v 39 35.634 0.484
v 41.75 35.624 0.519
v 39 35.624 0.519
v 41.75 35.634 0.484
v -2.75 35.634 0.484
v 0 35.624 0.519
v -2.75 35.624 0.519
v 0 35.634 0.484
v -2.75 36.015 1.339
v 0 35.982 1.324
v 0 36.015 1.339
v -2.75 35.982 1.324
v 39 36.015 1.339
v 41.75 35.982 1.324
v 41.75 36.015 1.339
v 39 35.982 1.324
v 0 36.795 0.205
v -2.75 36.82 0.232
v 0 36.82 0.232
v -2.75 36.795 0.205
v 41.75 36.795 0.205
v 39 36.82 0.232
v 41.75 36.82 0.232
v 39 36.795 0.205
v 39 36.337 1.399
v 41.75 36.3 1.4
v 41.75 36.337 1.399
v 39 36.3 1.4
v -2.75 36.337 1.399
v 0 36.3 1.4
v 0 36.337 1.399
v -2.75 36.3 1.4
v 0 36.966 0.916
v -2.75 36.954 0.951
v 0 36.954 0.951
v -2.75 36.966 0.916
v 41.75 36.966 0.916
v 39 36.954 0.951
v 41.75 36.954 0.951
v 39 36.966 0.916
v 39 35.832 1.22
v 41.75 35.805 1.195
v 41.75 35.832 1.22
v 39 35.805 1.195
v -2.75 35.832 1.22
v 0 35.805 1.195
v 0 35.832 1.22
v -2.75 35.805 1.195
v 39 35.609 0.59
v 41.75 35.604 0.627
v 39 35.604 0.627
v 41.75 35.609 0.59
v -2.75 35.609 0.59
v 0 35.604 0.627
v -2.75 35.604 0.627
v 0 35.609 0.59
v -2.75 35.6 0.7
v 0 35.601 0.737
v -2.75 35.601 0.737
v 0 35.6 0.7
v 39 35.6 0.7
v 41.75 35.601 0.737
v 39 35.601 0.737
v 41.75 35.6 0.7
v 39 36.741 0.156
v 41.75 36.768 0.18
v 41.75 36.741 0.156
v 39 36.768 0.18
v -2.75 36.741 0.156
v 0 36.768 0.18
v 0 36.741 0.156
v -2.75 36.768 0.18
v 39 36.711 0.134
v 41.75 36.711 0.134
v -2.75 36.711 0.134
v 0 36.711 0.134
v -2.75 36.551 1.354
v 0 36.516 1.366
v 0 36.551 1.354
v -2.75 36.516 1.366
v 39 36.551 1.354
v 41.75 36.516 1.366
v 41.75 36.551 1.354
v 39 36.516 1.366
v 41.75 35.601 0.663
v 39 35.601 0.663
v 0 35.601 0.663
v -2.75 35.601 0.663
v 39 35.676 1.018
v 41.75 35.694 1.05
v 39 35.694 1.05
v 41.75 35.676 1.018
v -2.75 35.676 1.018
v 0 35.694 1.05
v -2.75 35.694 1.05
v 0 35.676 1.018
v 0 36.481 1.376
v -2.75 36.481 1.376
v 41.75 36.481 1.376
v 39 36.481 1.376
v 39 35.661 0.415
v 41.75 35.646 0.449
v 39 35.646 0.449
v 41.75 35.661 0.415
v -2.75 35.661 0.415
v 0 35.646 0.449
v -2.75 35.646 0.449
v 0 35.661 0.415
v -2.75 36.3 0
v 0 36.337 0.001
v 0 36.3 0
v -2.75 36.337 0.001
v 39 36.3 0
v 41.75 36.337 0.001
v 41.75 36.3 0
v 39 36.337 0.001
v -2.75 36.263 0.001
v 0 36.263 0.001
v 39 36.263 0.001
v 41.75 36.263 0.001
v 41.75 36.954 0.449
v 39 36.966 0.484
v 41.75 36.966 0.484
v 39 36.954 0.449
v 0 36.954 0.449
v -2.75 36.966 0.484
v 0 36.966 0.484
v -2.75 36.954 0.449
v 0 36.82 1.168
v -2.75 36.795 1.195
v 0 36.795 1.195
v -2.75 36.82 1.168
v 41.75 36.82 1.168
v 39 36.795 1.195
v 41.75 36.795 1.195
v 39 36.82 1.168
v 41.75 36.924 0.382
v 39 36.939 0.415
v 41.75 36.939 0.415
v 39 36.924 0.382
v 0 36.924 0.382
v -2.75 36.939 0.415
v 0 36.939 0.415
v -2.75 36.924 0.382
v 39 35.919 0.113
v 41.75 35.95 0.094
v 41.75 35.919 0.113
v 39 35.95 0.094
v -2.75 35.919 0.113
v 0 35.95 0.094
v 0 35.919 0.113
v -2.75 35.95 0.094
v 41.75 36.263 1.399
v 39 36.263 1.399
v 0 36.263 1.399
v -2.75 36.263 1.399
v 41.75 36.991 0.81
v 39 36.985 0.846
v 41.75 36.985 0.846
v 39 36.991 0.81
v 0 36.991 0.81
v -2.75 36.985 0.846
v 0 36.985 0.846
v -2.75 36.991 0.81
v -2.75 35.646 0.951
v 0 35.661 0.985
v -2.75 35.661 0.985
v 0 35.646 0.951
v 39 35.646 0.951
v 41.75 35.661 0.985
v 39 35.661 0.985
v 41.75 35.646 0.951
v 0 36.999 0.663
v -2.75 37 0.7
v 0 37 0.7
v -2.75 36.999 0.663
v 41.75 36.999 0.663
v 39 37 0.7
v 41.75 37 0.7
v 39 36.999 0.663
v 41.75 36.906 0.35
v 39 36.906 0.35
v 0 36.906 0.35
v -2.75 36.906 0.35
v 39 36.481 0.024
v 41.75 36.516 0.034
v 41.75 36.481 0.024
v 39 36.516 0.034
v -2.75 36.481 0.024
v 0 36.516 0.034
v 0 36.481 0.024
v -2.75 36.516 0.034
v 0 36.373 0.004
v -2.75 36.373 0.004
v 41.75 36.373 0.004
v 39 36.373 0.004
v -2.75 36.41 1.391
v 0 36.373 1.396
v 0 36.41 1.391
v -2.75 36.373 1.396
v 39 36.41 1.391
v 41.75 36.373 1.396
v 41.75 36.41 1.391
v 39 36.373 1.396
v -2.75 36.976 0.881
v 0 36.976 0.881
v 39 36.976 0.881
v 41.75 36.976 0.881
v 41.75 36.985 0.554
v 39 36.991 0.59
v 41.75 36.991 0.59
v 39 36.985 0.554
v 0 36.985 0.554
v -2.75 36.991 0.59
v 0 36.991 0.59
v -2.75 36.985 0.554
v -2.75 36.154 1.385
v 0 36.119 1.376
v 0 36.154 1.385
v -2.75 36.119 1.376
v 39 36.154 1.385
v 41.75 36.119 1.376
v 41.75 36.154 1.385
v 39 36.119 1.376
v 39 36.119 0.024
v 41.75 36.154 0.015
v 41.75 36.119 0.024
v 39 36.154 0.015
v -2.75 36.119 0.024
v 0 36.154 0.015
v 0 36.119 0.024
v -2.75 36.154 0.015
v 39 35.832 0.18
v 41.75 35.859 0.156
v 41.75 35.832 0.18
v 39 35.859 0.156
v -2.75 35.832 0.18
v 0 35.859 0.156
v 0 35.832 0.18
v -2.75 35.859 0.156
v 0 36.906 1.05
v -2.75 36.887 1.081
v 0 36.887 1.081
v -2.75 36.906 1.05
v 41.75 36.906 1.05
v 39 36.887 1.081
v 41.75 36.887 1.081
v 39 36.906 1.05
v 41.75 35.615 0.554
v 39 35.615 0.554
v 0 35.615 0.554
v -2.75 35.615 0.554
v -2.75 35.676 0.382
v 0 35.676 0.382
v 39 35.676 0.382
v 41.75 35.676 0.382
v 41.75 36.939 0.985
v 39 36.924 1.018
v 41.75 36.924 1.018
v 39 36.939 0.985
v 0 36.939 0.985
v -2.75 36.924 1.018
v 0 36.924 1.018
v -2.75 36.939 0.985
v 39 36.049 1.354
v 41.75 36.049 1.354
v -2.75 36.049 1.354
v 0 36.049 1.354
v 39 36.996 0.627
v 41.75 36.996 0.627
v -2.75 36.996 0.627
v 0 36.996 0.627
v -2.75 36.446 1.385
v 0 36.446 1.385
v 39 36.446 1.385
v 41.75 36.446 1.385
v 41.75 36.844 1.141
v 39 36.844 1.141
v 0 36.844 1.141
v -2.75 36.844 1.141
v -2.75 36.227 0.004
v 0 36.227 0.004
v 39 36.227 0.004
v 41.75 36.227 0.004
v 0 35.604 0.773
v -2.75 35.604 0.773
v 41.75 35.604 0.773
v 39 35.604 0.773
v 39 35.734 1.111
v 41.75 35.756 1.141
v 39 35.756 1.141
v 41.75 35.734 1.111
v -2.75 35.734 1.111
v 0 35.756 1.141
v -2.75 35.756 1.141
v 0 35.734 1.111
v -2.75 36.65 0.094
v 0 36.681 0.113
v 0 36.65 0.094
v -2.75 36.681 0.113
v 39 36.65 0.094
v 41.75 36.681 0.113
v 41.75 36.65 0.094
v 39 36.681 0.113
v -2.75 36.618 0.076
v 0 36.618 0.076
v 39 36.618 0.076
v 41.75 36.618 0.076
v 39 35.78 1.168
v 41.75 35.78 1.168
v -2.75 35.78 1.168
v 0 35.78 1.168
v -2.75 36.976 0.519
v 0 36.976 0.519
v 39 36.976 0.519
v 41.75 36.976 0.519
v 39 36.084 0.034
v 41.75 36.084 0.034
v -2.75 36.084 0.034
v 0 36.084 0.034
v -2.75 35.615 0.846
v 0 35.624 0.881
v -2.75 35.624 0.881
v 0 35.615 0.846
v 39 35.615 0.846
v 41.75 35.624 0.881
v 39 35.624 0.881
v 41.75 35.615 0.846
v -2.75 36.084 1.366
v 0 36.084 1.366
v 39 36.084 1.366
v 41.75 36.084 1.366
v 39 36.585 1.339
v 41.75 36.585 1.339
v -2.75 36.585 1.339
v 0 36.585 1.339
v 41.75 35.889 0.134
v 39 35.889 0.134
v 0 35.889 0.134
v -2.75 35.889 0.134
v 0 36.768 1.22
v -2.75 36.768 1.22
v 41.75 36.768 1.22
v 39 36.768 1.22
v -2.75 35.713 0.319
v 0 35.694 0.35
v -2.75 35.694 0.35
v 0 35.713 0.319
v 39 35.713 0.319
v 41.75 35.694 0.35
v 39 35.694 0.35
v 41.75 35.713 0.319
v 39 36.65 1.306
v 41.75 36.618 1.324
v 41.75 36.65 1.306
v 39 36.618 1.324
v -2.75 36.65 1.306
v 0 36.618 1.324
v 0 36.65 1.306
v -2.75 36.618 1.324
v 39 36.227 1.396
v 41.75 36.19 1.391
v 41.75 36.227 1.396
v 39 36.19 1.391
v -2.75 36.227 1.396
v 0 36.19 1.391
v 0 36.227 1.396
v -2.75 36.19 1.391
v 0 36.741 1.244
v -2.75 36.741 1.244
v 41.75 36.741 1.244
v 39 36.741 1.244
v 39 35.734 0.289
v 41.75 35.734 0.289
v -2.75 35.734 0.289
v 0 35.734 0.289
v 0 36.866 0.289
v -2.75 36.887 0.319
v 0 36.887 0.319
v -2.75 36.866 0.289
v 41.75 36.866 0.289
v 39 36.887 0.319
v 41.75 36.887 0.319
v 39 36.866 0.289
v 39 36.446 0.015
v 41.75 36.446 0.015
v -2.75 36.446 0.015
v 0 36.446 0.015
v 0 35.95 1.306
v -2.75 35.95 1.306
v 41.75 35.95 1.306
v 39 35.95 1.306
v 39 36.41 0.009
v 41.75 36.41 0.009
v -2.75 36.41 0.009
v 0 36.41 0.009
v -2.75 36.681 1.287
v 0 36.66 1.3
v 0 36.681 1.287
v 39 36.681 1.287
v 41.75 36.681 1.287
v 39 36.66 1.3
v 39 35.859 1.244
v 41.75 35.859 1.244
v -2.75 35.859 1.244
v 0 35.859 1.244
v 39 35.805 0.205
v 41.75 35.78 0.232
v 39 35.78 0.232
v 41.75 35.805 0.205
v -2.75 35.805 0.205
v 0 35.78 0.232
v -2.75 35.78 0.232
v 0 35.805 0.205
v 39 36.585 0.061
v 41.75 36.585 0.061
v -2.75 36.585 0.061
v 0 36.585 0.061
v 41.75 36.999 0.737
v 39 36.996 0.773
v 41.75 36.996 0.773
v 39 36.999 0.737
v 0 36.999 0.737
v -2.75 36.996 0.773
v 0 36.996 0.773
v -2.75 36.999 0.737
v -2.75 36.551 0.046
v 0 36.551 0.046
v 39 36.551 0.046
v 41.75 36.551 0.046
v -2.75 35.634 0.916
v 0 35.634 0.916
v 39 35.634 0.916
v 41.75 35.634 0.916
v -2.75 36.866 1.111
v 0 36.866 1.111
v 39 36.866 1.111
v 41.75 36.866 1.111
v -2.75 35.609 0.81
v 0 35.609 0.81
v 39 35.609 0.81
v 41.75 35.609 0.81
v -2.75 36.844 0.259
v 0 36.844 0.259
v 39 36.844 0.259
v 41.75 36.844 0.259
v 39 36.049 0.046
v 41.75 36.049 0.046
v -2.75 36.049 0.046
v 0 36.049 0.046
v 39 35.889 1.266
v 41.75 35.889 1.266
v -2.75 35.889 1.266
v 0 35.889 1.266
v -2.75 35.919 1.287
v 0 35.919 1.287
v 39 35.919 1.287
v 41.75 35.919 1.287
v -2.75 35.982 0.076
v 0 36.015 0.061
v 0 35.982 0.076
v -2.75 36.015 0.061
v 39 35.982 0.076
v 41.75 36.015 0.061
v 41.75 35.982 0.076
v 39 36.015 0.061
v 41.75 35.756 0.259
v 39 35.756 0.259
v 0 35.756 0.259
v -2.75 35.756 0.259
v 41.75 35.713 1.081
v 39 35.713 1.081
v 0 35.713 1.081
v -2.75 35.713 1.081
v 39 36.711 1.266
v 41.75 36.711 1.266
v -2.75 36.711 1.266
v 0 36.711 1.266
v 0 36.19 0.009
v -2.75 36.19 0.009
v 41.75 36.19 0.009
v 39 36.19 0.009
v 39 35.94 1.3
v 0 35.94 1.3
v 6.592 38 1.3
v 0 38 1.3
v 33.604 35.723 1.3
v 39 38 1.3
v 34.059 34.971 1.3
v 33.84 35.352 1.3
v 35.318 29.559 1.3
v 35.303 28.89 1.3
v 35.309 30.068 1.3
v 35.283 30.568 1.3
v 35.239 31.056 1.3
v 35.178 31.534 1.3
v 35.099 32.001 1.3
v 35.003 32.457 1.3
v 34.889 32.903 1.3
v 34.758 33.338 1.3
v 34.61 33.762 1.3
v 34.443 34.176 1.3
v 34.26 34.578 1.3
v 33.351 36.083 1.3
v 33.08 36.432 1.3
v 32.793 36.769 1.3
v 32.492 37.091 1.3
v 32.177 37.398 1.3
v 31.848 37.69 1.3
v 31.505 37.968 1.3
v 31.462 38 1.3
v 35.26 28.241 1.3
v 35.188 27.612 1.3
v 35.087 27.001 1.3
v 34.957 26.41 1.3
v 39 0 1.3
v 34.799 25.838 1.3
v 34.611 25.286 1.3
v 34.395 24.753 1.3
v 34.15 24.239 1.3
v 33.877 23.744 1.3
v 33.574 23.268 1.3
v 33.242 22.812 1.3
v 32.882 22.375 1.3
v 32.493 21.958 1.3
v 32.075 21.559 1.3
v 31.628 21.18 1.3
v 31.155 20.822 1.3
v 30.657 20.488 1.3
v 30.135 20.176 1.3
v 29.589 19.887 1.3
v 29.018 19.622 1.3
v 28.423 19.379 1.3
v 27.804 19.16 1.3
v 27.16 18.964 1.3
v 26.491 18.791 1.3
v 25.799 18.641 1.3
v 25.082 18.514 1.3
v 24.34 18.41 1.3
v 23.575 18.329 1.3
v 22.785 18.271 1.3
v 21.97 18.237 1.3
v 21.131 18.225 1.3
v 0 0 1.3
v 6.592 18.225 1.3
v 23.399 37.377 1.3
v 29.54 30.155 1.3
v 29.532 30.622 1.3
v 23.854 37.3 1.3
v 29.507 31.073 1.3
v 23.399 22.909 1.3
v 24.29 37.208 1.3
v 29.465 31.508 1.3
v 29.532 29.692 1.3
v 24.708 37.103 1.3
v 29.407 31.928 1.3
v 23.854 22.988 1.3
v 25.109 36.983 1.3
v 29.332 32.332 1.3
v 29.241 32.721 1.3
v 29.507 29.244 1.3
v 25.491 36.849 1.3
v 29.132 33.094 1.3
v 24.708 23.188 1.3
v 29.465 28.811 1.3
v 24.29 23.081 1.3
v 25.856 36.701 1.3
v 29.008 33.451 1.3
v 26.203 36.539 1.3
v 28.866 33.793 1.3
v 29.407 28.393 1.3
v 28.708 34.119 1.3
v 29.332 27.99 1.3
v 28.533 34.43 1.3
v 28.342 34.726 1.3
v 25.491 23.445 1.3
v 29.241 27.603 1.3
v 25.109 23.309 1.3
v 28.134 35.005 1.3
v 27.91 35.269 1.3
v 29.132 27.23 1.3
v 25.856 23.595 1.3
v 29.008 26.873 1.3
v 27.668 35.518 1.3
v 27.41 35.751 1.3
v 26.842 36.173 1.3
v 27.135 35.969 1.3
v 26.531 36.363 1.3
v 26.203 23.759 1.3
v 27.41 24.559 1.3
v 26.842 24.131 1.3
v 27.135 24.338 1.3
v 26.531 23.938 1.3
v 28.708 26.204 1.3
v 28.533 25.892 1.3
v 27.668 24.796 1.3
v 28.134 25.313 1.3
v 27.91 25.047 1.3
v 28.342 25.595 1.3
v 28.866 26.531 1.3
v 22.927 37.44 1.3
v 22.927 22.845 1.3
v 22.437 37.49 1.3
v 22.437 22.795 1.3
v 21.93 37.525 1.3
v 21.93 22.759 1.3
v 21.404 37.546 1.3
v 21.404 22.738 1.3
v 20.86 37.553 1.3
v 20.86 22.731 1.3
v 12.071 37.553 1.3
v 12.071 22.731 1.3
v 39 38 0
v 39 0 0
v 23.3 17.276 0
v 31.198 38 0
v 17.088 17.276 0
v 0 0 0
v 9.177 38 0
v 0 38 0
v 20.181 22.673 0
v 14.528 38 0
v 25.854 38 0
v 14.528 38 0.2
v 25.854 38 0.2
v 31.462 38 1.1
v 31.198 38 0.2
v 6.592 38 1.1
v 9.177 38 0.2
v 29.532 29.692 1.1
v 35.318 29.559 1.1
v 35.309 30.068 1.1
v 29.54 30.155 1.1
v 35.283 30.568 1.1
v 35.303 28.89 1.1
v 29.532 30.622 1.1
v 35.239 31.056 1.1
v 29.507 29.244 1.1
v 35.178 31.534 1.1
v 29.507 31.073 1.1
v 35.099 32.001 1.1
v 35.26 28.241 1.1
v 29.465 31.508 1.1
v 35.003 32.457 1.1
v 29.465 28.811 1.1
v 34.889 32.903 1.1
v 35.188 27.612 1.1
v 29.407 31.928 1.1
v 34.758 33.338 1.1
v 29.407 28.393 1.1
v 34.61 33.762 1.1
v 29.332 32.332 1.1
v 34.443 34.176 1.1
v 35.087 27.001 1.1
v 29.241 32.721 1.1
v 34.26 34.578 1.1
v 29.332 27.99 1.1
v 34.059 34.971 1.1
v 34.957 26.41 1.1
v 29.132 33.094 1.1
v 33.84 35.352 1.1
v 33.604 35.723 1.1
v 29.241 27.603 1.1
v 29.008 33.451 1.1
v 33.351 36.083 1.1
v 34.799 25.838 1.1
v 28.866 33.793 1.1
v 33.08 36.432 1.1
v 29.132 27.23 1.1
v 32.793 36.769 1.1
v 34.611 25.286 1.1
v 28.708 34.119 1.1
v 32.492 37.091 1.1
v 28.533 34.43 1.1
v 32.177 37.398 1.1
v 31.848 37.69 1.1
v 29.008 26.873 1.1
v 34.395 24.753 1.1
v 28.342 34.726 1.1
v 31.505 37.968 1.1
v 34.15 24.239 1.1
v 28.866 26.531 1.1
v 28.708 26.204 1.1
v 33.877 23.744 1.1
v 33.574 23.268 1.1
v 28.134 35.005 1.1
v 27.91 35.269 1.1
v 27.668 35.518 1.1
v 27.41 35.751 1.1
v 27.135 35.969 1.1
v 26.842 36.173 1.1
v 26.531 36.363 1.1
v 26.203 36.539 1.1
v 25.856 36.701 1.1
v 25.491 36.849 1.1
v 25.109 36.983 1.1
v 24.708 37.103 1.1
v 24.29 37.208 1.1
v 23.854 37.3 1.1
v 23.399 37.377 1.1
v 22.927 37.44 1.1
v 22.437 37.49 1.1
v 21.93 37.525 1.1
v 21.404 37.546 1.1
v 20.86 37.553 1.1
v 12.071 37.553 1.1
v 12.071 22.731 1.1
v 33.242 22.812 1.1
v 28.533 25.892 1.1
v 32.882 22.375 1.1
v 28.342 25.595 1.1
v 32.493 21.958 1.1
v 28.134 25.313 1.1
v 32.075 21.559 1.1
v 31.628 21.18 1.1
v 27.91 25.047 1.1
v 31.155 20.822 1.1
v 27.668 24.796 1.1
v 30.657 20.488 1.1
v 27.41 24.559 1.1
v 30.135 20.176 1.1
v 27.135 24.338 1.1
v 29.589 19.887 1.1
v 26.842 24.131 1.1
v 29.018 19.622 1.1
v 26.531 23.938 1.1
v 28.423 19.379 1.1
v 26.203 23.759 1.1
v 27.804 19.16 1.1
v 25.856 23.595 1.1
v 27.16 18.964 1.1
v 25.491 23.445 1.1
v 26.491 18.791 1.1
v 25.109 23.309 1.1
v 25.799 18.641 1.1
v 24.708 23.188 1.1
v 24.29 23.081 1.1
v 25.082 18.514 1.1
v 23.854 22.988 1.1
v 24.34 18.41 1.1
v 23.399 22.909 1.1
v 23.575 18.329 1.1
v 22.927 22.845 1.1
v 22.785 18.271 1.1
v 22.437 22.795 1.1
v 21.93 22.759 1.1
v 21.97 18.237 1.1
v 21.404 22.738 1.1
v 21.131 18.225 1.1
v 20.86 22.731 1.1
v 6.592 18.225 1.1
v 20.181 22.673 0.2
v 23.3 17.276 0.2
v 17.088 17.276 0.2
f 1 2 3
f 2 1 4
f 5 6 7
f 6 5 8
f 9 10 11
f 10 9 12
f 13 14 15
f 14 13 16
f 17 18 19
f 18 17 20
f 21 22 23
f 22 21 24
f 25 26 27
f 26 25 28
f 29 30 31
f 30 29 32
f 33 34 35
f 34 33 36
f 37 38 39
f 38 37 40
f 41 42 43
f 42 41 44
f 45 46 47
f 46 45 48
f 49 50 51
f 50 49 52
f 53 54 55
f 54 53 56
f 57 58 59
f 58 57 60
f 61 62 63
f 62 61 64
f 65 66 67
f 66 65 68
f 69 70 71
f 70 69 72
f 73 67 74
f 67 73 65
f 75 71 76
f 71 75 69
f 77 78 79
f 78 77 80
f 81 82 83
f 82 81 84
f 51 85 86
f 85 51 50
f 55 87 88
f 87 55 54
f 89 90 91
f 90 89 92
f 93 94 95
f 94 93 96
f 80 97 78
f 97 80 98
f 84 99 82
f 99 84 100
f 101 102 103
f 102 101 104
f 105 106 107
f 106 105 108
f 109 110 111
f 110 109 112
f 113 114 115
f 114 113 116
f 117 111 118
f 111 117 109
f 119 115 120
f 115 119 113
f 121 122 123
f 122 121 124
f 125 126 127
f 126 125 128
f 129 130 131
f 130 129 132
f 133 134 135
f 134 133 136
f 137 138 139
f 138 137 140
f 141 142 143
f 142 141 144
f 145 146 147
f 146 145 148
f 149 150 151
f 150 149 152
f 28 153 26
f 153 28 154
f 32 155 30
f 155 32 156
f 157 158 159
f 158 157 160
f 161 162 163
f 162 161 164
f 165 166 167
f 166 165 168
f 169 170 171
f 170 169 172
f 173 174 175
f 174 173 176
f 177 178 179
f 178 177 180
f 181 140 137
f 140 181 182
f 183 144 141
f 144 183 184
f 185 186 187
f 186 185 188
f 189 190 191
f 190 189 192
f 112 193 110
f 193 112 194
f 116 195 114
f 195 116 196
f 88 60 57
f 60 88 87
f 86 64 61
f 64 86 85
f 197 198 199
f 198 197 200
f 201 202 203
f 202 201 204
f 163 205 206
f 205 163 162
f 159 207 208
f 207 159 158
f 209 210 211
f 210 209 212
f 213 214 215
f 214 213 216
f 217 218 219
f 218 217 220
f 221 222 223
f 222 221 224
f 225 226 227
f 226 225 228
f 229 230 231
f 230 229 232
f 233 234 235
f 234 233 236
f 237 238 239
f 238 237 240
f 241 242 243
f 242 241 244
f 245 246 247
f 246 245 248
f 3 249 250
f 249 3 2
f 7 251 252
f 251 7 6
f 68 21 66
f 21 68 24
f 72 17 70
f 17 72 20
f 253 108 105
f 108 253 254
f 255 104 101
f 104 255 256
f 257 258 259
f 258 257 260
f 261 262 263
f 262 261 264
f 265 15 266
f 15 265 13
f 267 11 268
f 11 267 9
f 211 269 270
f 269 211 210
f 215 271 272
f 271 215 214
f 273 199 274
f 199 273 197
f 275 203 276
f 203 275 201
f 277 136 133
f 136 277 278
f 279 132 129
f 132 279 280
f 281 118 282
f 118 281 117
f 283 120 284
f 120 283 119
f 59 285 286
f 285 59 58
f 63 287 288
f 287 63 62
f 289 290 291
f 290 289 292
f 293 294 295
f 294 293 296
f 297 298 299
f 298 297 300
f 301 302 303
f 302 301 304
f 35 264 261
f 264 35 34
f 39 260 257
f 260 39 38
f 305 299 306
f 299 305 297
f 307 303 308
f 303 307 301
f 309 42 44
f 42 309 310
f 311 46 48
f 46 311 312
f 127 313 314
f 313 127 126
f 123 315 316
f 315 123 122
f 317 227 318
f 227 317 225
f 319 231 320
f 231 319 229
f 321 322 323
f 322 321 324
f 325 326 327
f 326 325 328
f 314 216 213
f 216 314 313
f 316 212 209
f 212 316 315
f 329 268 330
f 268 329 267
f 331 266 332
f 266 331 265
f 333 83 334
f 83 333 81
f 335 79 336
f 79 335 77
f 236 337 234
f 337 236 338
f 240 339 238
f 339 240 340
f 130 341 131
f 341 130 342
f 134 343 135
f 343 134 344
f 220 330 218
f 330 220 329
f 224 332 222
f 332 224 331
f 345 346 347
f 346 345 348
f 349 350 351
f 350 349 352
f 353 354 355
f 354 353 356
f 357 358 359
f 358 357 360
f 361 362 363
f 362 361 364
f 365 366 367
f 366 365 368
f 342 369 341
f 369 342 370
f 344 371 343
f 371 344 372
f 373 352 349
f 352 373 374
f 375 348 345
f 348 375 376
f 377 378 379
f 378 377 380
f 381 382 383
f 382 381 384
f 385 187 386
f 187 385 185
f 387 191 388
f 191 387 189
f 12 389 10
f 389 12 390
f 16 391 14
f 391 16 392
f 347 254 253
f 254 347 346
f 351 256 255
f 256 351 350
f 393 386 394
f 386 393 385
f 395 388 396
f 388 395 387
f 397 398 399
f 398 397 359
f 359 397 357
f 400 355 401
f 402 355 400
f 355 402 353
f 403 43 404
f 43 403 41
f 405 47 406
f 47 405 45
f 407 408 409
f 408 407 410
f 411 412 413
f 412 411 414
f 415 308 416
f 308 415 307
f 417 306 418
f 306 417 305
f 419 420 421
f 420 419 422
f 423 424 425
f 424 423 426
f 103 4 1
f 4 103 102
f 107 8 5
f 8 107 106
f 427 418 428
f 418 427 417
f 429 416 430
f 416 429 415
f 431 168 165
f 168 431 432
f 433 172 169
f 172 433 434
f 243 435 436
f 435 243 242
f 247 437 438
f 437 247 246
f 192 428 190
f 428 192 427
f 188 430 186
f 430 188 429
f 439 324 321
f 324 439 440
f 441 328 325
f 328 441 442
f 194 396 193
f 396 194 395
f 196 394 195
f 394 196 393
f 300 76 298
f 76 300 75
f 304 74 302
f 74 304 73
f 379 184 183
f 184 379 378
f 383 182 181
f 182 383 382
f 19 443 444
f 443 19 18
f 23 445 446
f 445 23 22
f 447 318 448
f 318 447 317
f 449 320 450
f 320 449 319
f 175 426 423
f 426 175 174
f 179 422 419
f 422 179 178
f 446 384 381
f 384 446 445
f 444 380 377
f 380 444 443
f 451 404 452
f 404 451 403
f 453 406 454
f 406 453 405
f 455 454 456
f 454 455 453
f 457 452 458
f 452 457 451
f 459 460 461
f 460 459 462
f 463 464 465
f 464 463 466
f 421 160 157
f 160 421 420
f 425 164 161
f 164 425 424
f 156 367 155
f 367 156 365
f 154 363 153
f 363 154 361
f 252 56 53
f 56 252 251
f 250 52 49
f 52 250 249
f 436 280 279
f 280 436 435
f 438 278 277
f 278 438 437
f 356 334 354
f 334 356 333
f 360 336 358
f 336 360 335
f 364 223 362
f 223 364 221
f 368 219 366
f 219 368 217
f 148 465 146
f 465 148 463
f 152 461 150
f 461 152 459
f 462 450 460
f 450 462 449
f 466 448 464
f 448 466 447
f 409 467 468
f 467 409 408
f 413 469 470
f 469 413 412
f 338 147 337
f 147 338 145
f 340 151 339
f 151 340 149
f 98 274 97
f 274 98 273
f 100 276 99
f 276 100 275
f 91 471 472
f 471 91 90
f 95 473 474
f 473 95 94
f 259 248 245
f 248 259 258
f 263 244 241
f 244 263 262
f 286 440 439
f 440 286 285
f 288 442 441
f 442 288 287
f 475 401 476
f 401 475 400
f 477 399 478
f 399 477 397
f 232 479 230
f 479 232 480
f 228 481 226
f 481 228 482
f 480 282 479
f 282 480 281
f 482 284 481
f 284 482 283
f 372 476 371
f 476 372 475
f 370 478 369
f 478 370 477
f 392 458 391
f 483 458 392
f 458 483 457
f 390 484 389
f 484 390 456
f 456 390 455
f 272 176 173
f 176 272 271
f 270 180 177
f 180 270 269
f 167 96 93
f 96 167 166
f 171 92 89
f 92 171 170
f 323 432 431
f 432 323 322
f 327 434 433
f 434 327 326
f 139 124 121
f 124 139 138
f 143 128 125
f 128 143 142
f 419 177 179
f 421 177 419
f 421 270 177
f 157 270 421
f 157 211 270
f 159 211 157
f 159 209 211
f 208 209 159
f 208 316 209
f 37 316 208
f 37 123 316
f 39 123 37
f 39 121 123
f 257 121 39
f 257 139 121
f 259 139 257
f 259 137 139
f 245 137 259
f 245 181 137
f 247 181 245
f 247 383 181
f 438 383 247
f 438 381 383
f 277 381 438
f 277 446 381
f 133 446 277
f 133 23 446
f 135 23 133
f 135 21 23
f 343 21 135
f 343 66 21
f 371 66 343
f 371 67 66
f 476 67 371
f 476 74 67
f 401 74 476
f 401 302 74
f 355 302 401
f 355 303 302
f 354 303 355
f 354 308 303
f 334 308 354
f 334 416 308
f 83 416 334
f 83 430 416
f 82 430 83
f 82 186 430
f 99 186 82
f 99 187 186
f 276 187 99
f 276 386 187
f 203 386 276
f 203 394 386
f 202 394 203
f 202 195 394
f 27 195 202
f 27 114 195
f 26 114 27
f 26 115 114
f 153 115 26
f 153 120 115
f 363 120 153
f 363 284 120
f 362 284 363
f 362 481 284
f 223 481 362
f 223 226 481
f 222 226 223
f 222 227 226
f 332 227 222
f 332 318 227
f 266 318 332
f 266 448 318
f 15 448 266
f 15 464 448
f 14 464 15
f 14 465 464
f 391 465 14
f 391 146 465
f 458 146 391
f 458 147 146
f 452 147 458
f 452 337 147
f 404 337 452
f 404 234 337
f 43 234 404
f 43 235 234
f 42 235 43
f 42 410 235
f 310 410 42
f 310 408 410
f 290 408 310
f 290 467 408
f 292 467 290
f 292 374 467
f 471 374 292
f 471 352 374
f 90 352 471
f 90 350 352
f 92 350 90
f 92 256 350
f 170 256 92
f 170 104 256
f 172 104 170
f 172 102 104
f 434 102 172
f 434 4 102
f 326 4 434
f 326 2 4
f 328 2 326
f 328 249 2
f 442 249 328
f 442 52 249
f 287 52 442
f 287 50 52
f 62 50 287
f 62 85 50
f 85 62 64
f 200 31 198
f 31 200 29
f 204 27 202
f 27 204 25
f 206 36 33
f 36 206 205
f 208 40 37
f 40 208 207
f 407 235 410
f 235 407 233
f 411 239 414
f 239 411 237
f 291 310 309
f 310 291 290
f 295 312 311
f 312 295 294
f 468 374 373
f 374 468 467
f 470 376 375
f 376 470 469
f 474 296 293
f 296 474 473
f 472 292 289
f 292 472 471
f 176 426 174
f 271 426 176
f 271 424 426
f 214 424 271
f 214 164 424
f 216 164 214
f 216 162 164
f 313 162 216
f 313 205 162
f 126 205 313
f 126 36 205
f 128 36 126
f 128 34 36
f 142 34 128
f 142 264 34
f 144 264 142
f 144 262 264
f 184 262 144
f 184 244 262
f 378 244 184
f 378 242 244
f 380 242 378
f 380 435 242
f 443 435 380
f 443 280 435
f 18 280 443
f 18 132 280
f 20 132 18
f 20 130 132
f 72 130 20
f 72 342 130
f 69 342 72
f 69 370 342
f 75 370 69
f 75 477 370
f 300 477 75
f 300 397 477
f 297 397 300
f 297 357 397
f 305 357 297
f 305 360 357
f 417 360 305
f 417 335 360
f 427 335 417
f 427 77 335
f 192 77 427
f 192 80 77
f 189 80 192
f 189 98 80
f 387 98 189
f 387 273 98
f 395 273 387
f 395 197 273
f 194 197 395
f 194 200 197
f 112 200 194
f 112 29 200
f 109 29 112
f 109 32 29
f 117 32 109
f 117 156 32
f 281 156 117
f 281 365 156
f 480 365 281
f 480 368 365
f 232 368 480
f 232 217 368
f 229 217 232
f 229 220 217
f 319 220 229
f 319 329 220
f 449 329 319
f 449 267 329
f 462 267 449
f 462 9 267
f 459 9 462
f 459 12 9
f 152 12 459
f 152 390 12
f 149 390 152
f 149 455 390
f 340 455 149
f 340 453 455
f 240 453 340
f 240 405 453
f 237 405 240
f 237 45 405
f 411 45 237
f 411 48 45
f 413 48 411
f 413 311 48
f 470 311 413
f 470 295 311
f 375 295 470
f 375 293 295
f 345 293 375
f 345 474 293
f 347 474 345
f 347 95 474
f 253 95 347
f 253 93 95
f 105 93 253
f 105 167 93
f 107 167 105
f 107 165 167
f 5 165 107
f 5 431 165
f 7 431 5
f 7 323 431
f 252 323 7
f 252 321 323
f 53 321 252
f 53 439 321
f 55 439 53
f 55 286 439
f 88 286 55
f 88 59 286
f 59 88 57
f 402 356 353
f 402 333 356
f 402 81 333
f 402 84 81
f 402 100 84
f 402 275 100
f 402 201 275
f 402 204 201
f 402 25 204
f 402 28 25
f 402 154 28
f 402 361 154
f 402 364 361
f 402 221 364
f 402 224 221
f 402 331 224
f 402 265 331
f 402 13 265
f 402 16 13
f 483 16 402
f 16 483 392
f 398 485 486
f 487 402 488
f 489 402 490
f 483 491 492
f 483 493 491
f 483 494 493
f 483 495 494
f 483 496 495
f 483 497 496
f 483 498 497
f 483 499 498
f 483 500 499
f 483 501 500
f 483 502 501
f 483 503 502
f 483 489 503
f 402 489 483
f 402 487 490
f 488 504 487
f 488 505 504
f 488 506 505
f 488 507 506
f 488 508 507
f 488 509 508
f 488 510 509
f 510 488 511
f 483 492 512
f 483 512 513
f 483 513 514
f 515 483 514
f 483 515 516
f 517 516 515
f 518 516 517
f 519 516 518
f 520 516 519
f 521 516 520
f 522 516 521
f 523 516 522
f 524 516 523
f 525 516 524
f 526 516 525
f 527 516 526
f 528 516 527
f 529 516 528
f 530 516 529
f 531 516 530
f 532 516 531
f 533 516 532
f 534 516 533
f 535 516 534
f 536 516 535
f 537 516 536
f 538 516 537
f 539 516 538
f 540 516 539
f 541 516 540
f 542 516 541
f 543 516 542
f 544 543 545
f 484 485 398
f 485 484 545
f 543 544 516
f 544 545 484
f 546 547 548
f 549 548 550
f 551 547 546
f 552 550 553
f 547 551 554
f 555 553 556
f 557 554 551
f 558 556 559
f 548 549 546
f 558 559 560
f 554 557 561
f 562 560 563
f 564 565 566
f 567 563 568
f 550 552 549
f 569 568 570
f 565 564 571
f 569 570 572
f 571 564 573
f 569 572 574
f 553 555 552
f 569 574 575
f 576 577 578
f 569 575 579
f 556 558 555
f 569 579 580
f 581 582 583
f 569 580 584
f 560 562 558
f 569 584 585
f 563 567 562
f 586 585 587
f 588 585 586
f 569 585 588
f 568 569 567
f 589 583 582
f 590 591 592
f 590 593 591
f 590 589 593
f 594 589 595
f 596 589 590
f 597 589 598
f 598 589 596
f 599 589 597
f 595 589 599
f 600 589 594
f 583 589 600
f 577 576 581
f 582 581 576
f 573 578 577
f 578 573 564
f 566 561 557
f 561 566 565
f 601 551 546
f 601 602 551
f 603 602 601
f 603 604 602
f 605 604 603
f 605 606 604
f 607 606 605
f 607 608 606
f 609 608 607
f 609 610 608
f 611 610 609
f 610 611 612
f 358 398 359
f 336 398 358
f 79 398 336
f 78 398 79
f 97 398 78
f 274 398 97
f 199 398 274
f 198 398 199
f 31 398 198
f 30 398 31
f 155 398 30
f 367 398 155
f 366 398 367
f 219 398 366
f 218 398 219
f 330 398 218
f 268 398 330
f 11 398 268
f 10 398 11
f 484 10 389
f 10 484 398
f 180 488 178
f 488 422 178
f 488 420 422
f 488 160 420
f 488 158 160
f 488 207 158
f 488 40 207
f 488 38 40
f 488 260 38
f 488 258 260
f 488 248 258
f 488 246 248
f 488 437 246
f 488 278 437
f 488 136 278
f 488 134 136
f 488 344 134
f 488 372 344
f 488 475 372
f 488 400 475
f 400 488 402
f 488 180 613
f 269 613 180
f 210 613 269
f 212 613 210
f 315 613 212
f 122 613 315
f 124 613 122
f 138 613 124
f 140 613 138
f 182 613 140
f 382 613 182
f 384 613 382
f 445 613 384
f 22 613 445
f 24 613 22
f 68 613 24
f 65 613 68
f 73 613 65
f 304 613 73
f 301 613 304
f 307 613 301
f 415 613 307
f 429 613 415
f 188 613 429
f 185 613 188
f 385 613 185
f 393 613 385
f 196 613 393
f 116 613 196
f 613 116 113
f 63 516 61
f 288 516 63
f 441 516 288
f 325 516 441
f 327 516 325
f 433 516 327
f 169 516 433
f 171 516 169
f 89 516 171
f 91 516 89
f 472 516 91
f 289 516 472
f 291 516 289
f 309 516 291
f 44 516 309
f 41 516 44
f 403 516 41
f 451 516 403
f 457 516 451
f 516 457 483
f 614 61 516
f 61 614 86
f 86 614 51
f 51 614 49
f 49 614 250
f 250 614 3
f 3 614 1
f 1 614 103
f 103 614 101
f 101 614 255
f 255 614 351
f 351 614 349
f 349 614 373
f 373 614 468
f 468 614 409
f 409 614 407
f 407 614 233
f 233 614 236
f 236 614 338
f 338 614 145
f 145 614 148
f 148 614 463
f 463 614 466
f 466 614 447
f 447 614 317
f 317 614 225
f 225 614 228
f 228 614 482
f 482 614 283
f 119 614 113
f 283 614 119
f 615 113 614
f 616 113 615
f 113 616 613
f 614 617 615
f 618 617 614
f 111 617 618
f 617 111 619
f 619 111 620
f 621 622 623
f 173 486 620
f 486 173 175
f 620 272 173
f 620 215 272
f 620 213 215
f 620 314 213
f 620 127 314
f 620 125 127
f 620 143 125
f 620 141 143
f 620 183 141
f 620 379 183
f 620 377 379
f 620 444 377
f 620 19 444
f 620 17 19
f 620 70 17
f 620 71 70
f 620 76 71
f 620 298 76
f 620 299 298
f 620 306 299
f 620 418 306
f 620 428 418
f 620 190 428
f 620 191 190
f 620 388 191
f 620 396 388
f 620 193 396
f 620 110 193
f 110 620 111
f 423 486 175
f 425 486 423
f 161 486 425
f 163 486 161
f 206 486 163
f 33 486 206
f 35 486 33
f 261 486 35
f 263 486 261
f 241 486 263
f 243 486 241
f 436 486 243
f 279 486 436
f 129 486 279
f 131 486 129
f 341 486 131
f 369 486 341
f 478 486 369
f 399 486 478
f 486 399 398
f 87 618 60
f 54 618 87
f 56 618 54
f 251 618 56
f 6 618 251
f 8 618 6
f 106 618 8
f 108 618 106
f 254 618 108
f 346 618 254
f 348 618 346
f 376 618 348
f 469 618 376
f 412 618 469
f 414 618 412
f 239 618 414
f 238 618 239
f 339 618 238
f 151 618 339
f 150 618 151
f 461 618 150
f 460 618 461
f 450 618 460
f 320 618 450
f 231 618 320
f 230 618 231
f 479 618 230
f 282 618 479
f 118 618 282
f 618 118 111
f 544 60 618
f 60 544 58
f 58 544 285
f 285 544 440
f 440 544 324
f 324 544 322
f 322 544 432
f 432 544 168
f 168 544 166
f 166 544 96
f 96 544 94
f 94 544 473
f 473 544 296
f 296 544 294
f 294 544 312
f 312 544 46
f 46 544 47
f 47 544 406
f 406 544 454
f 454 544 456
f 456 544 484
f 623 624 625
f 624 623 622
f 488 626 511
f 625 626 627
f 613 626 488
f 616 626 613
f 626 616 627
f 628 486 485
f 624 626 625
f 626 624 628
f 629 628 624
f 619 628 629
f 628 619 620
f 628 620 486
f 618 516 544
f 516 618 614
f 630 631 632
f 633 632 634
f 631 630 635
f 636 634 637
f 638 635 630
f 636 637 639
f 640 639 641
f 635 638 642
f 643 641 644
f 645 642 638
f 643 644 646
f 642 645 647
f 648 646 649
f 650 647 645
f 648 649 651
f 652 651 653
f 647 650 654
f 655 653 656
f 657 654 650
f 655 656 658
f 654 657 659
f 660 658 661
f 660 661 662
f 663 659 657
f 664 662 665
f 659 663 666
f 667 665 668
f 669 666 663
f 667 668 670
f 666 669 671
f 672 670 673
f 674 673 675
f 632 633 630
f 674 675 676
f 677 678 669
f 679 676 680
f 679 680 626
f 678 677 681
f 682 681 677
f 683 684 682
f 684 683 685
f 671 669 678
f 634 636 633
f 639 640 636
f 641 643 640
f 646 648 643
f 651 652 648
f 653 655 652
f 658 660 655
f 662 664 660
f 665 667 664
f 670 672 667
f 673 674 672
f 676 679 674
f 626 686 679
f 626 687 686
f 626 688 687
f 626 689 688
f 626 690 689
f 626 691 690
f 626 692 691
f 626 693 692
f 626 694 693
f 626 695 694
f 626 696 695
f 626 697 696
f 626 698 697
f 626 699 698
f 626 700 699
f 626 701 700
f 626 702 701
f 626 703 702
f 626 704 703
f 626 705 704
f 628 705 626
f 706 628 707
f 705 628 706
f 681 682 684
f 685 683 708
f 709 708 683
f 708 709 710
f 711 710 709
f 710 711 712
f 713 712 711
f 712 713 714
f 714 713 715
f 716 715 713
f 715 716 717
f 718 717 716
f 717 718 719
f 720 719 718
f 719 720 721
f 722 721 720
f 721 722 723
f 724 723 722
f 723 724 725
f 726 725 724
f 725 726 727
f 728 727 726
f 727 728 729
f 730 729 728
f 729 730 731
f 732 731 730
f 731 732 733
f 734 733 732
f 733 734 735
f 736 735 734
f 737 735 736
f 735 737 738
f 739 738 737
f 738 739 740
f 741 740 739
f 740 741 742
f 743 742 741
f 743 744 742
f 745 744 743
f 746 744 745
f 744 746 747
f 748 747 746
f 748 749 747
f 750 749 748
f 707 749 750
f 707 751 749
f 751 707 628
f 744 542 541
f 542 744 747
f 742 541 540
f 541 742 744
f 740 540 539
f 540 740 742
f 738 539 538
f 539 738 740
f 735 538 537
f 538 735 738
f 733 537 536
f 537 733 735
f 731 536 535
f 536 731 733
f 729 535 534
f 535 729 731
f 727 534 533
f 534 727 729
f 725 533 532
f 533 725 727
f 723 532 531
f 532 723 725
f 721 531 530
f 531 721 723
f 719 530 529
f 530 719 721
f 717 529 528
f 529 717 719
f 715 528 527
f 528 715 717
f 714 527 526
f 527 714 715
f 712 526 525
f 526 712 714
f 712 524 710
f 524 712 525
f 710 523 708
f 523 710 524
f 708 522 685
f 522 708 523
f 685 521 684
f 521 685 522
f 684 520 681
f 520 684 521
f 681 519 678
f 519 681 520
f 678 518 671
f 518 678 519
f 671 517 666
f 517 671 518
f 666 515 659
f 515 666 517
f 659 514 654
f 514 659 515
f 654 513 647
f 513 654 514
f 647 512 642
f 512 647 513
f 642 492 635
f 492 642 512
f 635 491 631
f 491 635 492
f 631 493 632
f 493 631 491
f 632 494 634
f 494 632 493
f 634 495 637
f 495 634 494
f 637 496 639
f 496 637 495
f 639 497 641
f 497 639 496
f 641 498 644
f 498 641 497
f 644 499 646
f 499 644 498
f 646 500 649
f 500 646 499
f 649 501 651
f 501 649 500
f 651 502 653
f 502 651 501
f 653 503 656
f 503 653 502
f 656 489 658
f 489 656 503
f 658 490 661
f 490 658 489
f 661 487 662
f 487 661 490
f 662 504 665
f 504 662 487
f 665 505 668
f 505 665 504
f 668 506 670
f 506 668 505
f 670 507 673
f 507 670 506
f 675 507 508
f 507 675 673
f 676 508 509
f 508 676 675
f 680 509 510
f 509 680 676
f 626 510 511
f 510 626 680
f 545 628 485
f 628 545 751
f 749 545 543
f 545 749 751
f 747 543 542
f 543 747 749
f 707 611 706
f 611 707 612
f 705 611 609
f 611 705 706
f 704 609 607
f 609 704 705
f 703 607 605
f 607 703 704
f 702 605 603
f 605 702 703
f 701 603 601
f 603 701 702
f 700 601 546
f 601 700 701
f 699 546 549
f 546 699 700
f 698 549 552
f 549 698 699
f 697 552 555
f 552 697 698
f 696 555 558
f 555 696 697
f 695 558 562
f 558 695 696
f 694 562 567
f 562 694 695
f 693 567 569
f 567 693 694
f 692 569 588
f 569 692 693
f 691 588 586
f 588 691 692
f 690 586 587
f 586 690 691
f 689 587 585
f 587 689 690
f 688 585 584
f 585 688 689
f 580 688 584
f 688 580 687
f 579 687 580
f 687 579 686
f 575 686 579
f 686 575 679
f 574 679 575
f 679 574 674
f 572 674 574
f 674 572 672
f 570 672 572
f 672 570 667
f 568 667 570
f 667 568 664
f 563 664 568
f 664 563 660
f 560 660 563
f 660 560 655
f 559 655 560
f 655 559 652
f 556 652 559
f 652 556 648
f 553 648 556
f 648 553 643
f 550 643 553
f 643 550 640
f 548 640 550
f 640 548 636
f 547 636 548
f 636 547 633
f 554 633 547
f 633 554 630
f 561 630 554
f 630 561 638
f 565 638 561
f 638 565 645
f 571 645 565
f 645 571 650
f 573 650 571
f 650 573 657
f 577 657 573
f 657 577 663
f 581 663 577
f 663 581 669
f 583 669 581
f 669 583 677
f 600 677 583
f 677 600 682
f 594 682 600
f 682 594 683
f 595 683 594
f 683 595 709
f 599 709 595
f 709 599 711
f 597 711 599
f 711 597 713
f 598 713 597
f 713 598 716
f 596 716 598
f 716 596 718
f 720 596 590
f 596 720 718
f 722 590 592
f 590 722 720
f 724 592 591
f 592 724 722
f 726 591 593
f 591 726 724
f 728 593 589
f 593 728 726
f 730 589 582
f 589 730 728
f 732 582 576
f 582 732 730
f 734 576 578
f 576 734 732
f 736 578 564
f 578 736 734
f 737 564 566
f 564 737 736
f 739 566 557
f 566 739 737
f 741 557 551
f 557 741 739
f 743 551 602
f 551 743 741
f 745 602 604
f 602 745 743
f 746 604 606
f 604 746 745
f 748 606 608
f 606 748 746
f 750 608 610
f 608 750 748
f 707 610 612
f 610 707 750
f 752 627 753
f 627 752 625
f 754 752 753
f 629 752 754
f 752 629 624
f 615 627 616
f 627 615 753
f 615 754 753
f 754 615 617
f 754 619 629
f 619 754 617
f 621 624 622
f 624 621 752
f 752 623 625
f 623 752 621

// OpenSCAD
echo(version=version());

my_nbfaces=120;

font = "Linux Libertine Mono O";

letter_size = 40;
letter_height = 5;
letter_footprint = 0.2;

card_thickness = 1.3;
card_width = 39.5;
card_height = 38;

wheel_thickness = 2.5;
hole_radius = 1.2;
slack = 0.5;

letter_top="A";
letter_bottom="B";

module letter(l) {
	// Use linear_extrude() to make the letters 3D objects as they
	// are only 2D shapes when only using text()
	linear_extrude(height = letter_height) {
		text(l, size = letter_size, font = font, halign = "center", valign = "center", $fn = my_nbfaces);
	}
}


difference() {
    union() 
    {
        /* main surface */
        cube([card_width - slack, card_height, card_thickness]);

        difference() {
            translate([-wheel_thickness - slack / 2, card_height - (hole_radius - slack)- 1, hole_radius - slack]) {
                rotate([0, 90, 0]) {
                    cylinder(h=card_width + 2 * wheel_thickness, r= hole_radius - slack, $fn=my_nbfaces);
                }
            }
            
            translate([0, 0, card_thickness])
                cube([card_width - slack, card_height, card_thickness]);
        }
    }

    translate([card_width/2, card_height, card_thickness - letter_footprint]) 
        letter(letter_bottom);
    
    translate([card_width/2, card_height, letter_footprint])
        rotate([180, 0, 0])
            letter(letter_top);
}
